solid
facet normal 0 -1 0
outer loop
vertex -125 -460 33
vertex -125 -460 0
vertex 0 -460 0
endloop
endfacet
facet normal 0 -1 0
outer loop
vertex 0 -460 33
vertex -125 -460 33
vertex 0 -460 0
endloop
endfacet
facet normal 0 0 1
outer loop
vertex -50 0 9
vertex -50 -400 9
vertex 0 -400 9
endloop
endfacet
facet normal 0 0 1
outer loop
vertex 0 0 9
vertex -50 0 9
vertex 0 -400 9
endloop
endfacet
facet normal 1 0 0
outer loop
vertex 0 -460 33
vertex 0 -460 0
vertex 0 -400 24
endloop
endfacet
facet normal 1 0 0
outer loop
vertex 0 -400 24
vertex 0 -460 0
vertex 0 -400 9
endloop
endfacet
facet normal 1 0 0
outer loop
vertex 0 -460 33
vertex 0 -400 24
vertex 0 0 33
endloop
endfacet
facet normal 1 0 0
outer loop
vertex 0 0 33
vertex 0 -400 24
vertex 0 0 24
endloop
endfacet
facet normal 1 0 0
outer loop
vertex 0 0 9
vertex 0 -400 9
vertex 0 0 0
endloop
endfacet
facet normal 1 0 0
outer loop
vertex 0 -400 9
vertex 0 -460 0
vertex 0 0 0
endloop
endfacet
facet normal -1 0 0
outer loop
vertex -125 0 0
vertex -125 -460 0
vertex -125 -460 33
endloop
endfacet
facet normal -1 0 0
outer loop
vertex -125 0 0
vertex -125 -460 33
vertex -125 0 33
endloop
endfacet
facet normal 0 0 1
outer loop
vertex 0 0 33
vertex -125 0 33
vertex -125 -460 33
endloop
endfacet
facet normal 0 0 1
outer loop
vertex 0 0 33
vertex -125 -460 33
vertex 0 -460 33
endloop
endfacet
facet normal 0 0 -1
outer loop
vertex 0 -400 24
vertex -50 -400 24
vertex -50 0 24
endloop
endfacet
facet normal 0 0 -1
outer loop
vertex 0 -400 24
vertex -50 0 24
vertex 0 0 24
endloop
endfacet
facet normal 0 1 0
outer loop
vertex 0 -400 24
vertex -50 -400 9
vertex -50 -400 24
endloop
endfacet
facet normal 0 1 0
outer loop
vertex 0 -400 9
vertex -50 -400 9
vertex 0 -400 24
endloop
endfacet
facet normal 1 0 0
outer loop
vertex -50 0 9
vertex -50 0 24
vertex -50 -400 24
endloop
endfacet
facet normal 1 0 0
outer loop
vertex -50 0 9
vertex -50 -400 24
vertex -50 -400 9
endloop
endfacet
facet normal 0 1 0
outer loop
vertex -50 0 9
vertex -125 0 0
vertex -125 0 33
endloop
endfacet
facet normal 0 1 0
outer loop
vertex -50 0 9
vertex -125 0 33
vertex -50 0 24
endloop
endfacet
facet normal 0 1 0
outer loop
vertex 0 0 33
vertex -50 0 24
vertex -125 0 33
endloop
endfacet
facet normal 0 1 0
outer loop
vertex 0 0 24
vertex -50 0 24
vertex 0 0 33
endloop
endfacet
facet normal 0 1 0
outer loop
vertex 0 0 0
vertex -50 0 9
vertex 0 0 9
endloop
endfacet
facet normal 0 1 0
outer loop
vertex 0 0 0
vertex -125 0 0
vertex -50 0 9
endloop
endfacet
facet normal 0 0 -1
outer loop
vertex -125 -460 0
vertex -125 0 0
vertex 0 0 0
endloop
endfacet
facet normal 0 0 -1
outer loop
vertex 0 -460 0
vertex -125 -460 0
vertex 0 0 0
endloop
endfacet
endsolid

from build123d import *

# Parameters (mm, degrees)
SKETCH1_W           = 125
SKETCH1_H           = 460
BOSS_EXTRUDE1_DEPTH = 33
SKETCH2_W           = 50
SKETCH2_H           = 15
CUT_EXTRUDE1_DEPTH  = 400


with BuildPart() as part:
    # Sketch1 → Boss-Extrude1 (new body)
    with BuildSketch(Plane.XY):
        with Locations((-62.5, -230)):
            Rectangle(SKETCH1_W, SKETCH1_H)
    extrude(amount=BOSS_EXTRUDE1_DEPTH)

    # Sketch2 → Cut-Extrude1 (cut)
    with BuildSketch(Plane(origin=(0, 0, 0), x_dir=(1, 0, 0), z_dir=(0, 1, 0))):
        with Locations((-25, -16.5)):
            Rectangle(SKETCH2_W, SKETCH2_H)
    extrude(amount=-CUT_EXTRUDE1_DEPTH, mode=Mode.SUBTRACT)


solid = part.part
